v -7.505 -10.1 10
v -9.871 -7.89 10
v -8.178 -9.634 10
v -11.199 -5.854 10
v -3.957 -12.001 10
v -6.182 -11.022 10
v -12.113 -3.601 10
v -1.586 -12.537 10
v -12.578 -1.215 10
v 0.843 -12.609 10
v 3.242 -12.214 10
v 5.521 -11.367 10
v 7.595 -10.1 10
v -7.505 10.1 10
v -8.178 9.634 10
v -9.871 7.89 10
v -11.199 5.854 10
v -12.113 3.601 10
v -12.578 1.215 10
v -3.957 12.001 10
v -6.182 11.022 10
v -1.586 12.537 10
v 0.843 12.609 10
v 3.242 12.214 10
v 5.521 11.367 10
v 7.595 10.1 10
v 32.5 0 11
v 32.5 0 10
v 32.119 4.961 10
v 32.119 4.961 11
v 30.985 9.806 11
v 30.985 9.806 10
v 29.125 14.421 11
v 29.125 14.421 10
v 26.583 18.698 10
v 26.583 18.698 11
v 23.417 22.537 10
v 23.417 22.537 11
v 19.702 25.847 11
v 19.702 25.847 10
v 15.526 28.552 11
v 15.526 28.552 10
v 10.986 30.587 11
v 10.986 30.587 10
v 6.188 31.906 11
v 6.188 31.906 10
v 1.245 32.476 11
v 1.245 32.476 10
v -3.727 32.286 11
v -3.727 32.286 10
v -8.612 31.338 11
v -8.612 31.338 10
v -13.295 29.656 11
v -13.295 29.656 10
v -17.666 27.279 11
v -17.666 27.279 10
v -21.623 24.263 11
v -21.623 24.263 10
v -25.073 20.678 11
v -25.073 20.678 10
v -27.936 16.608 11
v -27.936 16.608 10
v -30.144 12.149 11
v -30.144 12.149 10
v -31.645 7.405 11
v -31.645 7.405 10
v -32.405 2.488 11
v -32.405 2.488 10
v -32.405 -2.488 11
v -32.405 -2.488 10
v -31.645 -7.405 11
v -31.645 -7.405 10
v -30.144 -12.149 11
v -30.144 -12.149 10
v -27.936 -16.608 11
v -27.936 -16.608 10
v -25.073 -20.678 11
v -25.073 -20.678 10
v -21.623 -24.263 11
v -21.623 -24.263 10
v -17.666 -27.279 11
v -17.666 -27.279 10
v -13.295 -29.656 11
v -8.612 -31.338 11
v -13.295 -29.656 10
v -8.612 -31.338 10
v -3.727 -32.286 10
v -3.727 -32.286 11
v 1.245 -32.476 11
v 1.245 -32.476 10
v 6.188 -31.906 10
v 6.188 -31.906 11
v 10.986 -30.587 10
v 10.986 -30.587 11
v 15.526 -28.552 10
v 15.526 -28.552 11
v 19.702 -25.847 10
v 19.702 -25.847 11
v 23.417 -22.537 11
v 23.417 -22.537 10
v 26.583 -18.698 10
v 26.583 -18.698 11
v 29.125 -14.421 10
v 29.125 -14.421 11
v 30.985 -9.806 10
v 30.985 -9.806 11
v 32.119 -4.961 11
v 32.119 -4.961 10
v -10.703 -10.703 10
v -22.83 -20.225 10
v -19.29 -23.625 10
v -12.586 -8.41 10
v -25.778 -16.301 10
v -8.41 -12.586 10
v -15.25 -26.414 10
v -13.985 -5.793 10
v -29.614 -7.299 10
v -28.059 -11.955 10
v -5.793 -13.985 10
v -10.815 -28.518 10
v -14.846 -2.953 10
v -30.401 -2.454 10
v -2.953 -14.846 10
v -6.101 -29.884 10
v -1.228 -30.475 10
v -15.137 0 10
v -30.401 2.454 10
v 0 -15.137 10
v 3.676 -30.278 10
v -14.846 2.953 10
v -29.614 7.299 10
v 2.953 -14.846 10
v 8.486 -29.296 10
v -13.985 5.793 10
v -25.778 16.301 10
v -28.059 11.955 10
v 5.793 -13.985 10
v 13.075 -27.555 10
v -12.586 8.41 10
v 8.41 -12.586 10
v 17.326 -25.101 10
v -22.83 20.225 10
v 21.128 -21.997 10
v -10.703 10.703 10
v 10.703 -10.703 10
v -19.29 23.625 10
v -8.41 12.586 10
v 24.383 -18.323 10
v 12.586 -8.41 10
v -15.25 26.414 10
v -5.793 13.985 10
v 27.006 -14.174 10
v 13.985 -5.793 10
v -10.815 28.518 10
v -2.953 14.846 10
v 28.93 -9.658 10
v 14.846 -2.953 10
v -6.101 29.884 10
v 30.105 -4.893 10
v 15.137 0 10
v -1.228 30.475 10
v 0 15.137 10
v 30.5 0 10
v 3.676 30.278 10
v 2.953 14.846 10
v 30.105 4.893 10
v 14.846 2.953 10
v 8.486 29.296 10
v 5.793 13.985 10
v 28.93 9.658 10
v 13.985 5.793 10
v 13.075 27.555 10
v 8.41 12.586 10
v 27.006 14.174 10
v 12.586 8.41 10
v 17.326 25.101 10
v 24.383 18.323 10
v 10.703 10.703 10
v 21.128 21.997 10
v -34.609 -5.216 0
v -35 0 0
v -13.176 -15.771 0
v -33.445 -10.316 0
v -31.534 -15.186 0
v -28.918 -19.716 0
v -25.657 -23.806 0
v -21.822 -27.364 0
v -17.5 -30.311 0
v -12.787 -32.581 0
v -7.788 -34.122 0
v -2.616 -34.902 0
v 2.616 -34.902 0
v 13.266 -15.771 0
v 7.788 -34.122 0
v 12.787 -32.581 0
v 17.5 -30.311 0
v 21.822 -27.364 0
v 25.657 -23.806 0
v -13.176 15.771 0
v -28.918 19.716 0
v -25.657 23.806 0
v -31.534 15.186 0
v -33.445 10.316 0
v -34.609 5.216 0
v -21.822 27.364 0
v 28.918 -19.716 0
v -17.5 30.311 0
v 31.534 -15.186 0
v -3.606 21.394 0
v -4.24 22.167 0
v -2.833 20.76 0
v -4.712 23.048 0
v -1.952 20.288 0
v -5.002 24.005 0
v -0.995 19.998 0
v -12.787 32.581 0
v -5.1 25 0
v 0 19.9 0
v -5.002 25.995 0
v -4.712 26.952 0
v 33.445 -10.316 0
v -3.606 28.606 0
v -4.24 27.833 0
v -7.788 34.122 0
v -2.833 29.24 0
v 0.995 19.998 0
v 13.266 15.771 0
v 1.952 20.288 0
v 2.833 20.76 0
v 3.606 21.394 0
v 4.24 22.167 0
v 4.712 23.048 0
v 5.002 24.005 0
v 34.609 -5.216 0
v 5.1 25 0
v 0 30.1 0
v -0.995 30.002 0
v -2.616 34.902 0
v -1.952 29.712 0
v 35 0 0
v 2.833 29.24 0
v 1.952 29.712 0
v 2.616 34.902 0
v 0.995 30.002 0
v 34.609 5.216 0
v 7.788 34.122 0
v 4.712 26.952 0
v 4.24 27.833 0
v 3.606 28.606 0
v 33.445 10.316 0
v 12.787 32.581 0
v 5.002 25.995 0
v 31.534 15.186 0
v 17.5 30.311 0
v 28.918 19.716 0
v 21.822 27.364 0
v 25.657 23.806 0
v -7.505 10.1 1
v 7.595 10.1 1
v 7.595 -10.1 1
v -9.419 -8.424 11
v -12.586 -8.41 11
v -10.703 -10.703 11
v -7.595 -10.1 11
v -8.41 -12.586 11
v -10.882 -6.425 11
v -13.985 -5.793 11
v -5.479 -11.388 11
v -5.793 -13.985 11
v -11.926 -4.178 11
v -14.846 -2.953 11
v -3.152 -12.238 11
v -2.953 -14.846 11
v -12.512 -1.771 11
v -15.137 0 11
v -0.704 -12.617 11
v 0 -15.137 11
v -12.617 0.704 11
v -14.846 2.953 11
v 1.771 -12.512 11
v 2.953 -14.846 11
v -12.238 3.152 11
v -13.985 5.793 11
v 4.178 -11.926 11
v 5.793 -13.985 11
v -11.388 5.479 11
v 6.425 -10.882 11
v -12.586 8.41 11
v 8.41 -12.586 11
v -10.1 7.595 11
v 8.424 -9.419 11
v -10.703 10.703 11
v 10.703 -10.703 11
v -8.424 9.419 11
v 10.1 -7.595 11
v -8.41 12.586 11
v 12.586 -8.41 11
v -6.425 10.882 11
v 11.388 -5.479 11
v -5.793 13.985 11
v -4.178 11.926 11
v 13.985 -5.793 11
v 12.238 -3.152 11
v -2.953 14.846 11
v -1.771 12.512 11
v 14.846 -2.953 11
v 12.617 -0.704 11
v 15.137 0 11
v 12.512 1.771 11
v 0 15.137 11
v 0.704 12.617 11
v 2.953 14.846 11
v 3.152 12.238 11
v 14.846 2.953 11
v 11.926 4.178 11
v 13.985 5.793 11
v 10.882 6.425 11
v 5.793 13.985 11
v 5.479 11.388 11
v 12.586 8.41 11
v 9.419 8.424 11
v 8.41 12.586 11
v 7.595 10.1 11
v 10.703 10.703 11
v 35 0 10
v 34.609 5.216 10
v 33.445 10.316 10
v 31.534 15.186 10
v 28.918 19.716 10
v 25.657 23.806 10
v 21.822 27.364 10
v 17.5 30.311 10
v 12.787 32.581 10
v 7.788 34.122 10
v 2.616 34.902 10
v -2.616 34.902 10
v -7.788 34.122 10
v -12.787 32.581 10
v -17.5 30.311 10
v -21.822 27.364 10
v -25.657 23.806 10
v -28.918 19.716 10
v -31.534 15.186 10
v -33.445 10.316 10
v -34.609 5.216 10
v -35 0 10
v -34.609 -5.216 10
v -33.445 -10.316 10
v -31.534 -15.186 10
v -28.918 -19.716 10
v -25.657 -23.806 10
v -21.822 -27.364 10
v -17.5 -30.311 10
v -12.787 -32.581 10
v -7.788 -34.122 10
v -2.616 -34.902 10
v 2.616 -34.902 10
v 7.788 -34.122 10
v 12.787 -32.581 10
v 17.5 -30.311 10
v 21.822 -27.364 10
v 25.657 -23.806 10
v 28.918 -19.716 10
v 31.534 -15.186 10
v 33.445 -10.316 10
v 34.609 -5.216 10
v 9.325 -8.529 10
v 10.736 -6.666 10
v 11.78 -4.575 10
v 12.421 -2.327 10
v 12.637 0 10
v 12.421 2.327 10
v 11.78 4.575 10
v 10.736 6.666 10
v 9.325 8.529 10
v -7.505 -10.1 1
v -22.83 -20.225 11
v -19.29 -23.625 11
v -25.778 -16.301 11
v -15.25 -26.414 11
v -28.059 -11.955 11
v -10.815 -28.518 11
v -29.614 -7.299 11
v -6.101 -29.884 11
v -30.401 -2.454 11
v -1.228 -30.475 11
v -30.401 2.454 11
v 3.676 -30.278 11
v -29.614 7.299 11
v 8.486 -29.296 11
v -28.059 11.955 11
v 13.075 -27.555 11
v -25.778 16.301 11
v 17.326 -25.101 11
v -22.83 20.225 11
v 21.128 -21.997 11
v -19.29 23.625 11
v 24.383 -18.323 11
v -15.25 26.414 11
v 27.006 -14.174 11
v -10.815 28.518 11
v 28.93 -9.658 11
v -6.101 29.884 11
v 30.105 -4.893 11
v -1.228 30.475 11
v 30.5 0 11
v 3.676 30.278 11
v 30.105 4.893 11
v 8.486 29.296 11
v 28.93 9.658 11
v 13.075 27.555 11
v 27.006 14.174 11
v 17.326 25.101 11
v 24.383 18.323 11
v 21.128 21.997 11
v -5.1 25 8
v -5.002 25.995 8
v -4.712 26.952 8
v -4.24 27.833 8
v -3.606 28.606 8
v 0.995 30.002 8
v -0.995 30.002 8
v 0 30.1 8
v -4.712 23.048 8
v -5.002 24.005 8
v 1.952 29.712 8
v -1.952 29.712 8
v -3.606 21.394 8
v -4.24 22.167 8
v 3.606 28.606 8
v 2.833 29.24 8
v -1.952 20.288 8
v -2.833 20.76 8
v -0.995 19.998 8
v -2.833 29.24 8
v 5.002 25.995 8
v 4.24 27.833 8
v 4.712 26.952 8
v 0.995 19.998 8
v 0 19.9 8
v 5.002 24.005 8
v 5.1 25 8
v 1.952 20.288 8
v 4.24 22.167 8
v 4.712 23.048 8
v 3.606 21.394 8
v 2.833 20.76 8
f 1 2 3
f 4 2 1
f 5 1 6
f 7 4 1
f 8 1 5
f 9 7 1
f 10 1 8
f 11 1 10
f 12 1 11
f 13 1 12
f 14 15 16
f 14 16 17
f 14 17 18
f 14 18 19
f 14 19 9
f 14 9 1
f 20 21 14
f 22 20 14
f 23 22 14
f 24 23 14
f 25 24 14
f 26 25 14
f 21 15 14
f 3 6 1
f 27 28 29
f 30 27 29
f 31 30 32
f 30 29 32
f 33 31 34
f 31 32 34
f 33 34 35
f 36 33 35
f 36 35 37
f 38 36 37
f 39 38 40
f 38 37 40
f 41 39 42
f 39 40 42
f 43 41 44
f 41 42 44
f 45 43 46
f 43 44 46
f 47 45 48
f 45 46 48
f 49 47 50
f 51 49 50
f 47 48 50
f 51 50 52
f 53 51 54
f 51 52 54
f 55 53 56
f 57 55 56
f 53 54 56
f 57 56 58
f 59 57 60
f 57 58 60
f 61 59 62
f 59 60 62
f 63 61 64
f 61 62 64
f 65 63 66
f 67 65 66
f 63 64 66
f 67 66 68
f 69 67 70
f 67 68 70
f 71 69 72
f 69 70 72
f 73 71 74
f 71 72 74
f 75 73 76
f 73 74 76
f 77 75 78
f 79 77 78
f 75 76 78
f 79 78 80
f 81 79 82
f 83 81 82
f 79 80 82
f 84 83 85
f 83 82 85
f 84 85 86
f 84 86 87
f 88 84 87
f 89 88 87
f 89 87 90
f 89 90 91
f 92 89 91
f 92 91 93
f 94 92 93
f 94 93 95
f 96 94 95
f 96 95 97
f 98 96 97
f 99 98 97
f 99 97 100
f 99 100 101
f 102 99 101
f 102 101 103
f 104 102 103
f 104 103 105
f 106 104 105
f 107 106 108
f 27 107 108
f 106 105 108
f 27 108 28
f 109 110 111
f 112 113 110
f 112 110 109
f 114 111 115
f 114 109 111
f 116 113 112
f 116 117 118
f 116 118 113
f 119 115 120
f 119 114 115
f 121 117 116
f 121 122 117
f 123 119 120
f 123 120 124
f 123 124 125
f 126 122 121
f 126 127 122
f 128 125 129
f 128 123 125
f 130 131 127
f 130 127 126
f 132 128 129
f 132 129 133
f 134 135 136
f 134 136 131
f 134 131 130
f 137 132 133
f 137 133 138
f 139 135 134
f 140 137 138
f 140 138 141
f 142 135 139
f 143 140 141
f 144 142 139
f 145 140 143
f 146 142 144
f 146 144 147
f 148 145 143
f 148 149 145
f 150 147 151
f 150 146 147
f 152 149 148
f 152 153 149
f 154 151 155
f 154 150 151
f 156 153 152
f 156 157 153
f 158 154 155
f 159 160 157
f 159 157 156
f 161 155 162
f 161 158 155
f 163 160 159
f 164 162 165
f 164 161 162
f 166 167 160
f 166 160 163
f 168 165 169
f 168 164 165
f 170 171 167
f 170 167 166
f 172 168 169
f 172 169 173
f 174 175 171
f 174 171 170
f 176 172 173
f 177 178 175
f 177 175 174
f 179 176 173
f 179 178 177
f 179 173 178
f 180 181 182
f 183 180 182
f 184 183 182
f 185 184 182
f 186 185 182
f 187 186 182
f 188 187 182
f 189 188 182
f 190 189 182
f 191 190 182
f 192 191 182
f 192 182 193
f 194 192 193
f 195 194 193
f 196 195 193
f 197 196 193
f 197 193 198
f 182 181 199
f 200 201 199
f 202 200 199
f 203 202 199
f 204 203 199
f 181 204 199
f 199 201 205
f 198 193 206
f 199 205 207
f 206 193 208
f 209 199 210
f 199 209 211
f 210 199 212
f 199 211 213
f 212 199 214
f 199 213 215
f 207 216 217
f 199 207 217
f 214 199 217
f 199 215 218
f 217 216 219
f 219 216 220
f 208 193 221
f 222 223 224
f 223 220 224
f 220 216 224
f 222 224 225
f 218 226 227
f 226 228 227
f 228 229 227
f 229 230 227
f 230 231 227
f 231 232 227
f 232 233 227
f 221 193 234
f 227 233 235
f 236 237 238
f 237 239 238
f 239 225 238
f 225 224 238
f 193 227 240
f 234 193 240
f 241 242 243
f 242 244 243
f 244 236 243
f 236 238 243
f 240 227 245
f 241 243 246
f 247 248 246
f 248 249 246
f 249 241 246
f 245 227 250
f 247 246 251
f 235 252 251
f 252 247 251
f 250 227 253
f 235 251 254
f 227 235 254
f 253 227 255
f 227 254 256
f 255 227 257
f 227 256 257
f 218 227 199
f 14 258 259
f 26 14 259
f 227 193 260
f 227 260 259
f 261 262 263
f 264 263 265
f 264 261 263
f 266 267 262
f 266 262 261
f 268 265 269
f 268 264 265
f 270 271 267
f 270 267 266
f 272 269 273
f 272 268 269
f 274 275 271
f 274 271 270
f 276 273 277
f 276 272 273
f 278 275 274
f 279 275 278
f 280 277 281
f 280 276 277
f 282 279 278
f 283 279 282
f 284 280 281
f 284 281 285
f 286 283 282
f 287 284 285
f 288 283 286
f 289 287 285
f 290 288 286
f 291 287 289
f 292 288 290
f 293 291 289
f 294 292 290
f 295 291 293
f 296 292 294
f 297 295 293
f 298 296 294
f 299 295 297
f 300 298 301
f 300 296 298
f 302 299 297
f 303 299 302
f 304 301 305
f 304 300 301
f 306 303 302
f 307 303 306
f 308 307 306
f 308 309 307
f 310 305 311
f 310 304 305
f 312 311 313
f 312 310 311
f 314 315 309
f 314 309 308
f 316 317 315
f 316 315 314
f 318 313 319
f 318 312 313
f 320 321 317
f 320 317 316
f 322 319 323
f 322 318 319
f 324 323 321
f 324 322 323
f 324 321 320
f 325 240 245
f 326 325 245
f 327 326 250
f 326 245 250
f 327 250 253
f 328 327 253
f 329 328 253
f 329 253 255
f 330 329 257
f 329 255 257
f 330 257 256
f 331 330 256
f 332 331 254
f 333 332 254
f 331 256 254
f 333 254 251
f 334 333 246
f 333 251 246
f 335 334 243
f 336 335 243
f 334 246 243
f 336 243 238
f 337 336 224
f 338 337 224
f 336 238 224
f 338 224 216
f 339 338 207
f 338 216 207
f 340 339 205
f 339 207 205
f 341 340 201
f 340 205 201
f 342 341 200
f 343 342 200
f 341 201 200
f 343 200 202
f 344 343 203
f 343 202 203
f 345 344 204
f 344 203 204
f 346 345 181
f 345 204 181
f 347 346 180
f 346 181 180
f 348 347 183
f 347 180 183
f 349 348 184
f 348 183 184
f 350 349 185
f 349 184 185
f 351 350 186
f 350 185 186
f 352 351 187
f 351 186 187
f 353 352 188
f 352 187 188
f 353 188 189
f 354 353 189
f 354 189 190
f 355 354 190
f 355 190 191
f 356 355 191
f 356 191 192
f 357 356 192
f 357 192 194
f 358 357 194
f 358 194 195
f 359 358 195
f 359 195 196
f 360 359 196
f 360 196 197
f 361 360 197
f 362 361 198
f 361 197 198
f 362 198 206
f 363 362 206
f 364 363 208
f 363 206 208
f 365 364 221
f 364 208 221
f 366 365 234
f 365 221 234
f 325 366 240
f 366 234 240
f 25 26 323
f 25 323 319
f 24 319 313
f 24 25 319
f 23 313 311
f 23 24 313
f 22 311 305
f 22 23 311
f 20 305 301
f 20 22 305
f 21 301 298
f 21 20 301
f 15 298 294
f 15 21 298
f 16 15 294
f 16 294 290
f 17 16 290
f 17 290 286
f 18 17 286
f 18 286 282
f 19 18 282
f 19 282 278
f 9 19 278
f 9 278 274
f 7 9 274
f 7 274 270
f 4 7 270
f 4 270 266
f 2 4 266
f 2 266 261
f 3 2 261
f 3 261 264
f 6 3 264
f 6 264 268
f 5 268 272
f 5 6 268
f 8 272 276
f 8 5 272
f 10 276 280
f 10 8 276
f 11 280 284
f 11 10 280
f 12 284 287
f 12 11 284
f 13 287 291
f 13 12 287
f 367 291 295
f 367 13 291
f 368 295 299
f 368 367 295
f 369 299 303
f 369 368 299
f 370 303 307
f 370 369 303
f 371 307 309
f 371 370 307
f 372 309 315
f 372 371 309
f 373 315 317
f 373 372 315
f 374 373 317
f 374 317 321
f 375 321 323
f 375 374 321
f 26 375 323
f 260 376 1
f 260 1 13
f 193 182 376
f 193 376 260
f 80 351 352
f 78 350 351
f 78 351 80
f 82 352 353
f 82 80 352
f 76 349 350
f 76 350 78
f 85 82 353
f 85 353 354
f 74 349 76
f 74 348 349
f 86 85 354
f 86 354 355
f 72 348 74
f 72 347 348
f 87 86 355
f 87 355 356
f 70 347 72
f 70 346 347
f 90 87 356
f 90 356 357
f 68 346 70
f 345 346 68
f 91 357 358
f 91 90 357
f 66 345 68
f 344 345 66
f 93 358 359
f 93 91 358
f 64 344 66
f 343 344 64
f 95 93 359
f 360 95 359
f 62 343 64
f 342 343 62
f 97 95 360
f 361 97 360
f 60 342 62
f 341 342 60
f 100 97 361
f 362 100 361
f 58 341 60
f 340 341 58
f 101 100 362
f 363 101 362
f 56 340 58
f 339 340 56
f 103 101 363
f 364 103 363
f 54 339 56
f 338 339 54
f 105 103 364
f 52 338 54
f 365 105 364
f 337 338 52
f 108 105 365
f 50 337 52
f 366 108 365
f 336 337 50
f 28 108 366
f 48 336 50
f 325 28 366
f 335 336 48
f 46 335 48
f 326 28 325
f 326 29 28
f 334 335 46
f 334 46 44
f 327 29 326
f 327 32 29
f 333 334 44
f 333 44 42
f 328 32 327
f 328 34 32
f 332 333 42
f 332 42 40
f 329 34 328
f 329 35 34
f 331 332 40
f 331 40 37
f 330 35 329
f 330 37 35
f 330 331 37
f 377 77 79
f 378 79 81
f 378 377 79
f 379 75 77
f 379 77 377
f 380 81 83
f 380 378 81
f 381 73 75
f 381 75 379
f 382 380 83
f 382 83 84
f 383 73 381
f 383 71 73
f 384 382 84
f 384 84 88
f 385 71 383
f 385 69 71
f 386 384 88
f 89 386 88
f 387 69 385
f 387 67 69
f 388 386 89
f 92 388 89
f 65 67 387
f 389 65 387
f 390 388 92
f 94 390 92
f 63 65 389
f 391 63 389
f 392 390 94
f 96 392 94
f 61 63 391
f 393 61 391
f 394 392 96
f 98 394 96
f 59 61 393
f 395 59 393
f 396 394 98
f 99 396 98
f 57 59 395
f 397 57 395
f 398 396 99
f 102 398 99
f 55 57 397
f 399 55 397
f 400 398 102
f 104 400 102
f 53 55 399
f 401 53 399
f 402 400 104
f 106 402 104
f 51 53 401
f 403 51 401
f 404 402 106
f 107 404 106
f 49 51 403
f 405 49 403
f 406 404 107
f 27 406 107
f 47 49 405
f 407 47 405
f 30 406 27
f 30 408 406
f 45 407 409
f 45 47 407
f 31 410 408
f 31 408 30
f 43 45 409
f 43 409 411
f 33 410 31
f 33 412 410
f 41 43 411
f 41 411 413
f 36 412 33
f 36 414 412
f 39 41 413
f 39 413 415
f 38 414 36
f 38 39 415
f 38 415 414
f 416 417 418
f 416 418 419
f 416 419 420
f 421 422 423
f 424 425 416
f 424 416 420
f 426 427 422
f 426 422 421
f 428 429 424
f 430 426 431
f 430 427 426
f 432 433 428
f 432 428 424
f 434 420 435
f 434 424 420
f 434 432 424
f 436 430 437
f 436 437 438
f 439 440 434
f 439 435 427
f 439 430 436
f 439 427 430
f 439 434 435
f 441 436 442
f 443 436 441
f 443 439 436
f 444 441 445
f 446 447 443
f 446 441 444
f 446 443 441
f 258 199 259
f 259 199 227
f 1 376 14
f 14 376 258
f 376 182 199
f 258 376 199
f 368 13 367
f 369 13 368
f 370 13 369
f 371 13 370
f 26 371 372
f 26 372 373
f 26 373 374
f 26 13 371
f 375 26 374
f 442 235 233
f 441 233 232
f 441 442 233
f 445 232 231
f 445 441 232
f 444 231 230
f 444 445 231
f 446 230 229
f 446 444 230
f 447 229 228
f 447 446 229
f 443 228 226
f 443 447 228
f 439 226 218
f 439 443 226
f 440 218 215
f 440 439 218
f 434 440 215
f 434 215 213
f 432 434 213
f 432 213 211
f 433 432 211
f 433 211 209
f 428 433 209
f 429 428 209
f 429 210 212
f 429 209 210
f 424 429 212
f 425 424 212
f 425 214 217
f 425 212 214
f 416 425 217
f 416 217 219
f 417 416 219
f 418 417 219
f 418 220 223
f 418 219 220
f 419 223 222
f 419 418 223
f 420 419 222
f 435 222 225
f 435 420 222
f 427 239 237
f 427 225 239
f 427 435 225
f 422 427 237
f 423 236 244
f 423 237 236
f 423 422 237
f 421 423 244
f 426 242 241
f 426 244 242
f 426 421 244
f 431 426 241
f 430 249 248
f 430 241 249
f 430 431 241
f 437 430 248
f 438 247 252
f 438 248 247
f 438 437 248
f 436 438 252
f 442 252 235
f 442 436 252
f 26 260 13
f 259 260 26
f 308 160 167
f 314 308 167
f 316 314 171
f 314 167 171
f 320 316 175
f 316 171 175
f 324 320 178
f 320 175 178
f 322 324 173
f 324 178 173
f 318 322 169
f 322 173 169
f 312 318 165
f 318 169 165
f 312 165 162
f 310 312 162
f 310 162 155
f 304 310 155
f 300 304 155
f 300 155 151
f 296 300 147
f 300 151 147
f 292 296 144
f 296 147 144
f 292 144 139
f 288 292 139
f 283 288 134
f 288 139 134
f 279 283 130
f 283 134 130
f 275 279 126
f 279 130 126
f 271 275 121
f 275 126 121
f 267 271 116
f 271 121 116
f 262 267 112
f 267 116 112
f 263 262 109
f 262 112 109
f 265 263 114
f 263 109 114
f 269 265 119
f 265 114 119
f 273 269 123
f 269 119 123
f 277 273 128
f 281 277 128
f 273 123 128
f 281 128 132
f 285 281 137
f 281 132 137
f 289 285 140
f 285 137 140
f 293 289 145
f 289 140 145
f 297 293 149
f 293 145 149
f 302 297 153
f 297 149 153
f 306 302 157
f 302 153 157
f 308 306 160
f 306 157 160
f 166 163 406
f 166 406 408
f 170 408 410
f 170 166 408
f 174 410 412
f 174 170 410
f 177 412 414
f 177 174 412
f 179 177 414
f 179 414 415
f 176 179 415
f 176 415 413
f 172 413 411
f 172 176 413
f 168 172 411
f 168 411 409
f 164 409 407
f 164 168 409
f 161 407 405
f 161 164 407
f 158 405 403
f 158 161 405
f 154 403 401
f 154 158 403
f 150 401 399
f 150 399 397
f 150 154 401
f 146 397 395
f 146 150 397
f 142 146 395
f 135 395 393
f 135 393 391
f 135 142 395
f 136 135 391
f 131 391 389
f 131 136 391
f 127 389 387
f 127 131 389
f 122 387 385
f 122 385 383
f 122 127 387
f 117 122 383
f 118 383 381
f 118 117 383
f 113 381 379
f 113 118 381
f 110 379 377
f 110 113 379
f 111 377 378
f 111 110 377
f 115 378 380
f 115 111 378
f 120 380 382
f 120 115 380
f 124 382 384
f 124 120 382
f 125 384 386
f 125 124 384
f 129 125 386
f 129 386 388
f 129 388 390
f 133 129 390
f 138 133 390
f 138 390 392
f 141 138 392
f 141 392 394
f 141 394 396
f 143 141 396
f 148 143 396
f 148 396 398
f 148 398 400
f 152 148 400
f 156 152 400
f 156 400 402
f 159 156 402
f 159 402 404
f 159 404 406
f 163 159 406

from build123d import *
from OCP.BRepFilletAPI import BRepFilletAPI_MakeChamfer

# Parameters (mm, degrees)
SKIZZE1_R                            = 35
AUFSATZ_LINEAR_AUSTRAGEN1_DEPTH      = 10
SKIZZE1_3_OUTSIDE_W                  = 91.9
SKIZZE1_3_OUTSIDE_H                  = 91.9
SKIZZE1_3_OUTSIDE_R                  = 35
SKIZZE1_3_OUTSIDE_W_2                = 15.1
SKIZZE1_3_OUTSIDE_H_2                = 20.2
SCHNITT_LINEAR_AUSTRAGEN1_DEPTH      = 10
SCHNITT_LINEAR_AUSTRAGEN2_DEPTH      = 1
SCHNITT_LINEAR_AUSTRAGEN2_DEPTH_BACK = 8
SKIZZE2_R                            = 5.1
SKIZZE3_R                            = 32.5
SKIZZE3_R_2                          = 30.5
AUFSATZ_LINEAR_AUSTRAGEN2_DEPTH      = 1
SKIZZE4_R                            = 15.137010129
SKIZZE4_R_2                          = 12.637010129
AUFSATZ_LINEAR_AUSTRAGEN3_DEPTH      = 1
FASE1_SIZE                           = 1
FASE1_SIZE2                          = 5.67128182


with BuildPart() as part:
    # Skizze1 → Aufsatz-Linear austragen1 (new body)
    with BuildSketch(Plane.XY):
        Circle(SKIZZE1_R)
    extrude(amount=AUFSATZ_LINEAR_AUSTRAGEN1_DEPTH)

    # Skizze1<3> outside → Schnitt-Linear austragen1 (cut)
    # profile 1 of 2: a face of its own
    with BuildSketch(Plane.XY):
        Rectangle(SKIZZE1_3_OUTSIDE_W, SKIZZE1_3_OUTSIDE_H)
        Circle(SKIZZE1_3_OUTSIDE_R, mode=Mode.SUBTRACT)
    # profile 2 of 2: a face of its own
    with BuildSketch(Plane.XY):
        with Locations((0.045, 0)):
            Rectangle(SKIZZE1_3_OUTSIDE_W_2, SKIZZE1_3_OUTSIDE_H_2)
    extrude(amount=SCHNITT_LINEAR_AUSTRAGEN1_DEPTH, mode=Mode.SUBTRACT)

    # Skizze2 → Schnitt-Linear austragen2 (cut, two sides: drawn at the far end of the back side and taken through both)
    with BuildSketch(Plane(origin=(0, 0, 0), x_dir=(-1, 0, 0), z_dir=(0, 0, -1)).offset(-SCHNITT_LINEAR_AUSTRAGEN2_DEPTH_BACK)):
        with Locations((0, 25)):
            Circle(SKIZZE2_R)
    extrude(amount=SCHNITT_LINEAR_AUSTRAGEN2_DEPTH + SCHNITT_LINEAR_AUSTRAGEN2_DEPTH_BACK, mode=Mode.SUBTRACT)

    # Skizze3 → Aufsatz-Linear austragen2 (add)
    with BuildSketch(Plane.XY.offset(10)):
        Circle(SKIZZE3_R)
        Circle(SKIZZE3_R_2, mode=Mode.SUBTRACT)
    extrude(amount=AUFSATZ_LINEAR_AUSTRAGEN2_DEPTH)

    # Skizze4 → Aufsatz-Linear austragen3 (add)
    with BuildSketch(Plane.XY.offset(10)):
        Circle(SKIZZE4_R)
        Circle(SKIZZE4_R_2, mode=Mode.SUBTRACT)
    extrude(amount=AUFSATZ_LINEAR_AUSTRAGEN3_DEPTH)

    # Fase1: one chamfer whose edges measure the first distance from different faces: ONE call of the kernel's chamfer builder (chamfer() names one face for all edges)
    fase1_edges_1 = [part.edges().sort_by_distance(p)[0] for p in [
        (-7.505, 0, 0),
    ]]
    fase1_side_1 = [part.faces().sort_by_distance(p)[0] for p in [
        (-7.505, 0, 5),
    ]]
    fase1_edges_2 = [part.edges().sort_by_distance(p)[0] for p in [
        (0.045, 10.1, 0),
    ]]
    fase1_side_2 = [part.faces().sort_by_distance(p)[0] for p in [
        (0.045, 10.1, 5),
    ]]
    fase1_edges_3 = [part.edges().sort_by_distance(p)[0] for p in [
        (7.595, 0, 0),
    ]]
    fase1_side_3 = [part.faces().sort_by_distance(p)[0] for p in [
        (7.595, 0, 5),
    ]]
    fase1_edges_4 = [part.edges().sort_by_distance(p)[0] for p in [
        (0.045, -10.1, 0),
    ]]
    fase1_side_4 = [part.faces().sort_by_distance(p)[0] for p in [
        (0.045, -10.1, 5),
    ]]
    fase1 = BRepFilletAPI_MakeChamfer(part.part.solid().wrapped)
    for e in fase1_edges_1:
        fase1.Add(FASE1_SIZE, FASE1_SIZE2, e.wrapped, fase1_side_1[0].wrapped)  # the first distance lies on this face
    for e in fase1_edges_2:
        fase1.Add(FASE1_SIZE, FASE1_SIZE2, e.wrapped, fase1_side_2[0].wrapped)  # the first distance lies on this face
    for e in fase1_edges_3:
        fase1.Add(FASE1_SIZE, FASE1_SIZE2, e.wrapped, fase1_side_3[0].wrapped)  # the first distance lies on this face
    for e in fase1_edges_4:
        fase1.Add(FASE1_SIZE, FASE1_SIZE2, e.wrapped, fase1_side_4[0].wrapped)  # the first distance lies on this face
    add(Compound.cast(fase1.Shape()), mode=Mode.REPLACE)


solid = part.part
